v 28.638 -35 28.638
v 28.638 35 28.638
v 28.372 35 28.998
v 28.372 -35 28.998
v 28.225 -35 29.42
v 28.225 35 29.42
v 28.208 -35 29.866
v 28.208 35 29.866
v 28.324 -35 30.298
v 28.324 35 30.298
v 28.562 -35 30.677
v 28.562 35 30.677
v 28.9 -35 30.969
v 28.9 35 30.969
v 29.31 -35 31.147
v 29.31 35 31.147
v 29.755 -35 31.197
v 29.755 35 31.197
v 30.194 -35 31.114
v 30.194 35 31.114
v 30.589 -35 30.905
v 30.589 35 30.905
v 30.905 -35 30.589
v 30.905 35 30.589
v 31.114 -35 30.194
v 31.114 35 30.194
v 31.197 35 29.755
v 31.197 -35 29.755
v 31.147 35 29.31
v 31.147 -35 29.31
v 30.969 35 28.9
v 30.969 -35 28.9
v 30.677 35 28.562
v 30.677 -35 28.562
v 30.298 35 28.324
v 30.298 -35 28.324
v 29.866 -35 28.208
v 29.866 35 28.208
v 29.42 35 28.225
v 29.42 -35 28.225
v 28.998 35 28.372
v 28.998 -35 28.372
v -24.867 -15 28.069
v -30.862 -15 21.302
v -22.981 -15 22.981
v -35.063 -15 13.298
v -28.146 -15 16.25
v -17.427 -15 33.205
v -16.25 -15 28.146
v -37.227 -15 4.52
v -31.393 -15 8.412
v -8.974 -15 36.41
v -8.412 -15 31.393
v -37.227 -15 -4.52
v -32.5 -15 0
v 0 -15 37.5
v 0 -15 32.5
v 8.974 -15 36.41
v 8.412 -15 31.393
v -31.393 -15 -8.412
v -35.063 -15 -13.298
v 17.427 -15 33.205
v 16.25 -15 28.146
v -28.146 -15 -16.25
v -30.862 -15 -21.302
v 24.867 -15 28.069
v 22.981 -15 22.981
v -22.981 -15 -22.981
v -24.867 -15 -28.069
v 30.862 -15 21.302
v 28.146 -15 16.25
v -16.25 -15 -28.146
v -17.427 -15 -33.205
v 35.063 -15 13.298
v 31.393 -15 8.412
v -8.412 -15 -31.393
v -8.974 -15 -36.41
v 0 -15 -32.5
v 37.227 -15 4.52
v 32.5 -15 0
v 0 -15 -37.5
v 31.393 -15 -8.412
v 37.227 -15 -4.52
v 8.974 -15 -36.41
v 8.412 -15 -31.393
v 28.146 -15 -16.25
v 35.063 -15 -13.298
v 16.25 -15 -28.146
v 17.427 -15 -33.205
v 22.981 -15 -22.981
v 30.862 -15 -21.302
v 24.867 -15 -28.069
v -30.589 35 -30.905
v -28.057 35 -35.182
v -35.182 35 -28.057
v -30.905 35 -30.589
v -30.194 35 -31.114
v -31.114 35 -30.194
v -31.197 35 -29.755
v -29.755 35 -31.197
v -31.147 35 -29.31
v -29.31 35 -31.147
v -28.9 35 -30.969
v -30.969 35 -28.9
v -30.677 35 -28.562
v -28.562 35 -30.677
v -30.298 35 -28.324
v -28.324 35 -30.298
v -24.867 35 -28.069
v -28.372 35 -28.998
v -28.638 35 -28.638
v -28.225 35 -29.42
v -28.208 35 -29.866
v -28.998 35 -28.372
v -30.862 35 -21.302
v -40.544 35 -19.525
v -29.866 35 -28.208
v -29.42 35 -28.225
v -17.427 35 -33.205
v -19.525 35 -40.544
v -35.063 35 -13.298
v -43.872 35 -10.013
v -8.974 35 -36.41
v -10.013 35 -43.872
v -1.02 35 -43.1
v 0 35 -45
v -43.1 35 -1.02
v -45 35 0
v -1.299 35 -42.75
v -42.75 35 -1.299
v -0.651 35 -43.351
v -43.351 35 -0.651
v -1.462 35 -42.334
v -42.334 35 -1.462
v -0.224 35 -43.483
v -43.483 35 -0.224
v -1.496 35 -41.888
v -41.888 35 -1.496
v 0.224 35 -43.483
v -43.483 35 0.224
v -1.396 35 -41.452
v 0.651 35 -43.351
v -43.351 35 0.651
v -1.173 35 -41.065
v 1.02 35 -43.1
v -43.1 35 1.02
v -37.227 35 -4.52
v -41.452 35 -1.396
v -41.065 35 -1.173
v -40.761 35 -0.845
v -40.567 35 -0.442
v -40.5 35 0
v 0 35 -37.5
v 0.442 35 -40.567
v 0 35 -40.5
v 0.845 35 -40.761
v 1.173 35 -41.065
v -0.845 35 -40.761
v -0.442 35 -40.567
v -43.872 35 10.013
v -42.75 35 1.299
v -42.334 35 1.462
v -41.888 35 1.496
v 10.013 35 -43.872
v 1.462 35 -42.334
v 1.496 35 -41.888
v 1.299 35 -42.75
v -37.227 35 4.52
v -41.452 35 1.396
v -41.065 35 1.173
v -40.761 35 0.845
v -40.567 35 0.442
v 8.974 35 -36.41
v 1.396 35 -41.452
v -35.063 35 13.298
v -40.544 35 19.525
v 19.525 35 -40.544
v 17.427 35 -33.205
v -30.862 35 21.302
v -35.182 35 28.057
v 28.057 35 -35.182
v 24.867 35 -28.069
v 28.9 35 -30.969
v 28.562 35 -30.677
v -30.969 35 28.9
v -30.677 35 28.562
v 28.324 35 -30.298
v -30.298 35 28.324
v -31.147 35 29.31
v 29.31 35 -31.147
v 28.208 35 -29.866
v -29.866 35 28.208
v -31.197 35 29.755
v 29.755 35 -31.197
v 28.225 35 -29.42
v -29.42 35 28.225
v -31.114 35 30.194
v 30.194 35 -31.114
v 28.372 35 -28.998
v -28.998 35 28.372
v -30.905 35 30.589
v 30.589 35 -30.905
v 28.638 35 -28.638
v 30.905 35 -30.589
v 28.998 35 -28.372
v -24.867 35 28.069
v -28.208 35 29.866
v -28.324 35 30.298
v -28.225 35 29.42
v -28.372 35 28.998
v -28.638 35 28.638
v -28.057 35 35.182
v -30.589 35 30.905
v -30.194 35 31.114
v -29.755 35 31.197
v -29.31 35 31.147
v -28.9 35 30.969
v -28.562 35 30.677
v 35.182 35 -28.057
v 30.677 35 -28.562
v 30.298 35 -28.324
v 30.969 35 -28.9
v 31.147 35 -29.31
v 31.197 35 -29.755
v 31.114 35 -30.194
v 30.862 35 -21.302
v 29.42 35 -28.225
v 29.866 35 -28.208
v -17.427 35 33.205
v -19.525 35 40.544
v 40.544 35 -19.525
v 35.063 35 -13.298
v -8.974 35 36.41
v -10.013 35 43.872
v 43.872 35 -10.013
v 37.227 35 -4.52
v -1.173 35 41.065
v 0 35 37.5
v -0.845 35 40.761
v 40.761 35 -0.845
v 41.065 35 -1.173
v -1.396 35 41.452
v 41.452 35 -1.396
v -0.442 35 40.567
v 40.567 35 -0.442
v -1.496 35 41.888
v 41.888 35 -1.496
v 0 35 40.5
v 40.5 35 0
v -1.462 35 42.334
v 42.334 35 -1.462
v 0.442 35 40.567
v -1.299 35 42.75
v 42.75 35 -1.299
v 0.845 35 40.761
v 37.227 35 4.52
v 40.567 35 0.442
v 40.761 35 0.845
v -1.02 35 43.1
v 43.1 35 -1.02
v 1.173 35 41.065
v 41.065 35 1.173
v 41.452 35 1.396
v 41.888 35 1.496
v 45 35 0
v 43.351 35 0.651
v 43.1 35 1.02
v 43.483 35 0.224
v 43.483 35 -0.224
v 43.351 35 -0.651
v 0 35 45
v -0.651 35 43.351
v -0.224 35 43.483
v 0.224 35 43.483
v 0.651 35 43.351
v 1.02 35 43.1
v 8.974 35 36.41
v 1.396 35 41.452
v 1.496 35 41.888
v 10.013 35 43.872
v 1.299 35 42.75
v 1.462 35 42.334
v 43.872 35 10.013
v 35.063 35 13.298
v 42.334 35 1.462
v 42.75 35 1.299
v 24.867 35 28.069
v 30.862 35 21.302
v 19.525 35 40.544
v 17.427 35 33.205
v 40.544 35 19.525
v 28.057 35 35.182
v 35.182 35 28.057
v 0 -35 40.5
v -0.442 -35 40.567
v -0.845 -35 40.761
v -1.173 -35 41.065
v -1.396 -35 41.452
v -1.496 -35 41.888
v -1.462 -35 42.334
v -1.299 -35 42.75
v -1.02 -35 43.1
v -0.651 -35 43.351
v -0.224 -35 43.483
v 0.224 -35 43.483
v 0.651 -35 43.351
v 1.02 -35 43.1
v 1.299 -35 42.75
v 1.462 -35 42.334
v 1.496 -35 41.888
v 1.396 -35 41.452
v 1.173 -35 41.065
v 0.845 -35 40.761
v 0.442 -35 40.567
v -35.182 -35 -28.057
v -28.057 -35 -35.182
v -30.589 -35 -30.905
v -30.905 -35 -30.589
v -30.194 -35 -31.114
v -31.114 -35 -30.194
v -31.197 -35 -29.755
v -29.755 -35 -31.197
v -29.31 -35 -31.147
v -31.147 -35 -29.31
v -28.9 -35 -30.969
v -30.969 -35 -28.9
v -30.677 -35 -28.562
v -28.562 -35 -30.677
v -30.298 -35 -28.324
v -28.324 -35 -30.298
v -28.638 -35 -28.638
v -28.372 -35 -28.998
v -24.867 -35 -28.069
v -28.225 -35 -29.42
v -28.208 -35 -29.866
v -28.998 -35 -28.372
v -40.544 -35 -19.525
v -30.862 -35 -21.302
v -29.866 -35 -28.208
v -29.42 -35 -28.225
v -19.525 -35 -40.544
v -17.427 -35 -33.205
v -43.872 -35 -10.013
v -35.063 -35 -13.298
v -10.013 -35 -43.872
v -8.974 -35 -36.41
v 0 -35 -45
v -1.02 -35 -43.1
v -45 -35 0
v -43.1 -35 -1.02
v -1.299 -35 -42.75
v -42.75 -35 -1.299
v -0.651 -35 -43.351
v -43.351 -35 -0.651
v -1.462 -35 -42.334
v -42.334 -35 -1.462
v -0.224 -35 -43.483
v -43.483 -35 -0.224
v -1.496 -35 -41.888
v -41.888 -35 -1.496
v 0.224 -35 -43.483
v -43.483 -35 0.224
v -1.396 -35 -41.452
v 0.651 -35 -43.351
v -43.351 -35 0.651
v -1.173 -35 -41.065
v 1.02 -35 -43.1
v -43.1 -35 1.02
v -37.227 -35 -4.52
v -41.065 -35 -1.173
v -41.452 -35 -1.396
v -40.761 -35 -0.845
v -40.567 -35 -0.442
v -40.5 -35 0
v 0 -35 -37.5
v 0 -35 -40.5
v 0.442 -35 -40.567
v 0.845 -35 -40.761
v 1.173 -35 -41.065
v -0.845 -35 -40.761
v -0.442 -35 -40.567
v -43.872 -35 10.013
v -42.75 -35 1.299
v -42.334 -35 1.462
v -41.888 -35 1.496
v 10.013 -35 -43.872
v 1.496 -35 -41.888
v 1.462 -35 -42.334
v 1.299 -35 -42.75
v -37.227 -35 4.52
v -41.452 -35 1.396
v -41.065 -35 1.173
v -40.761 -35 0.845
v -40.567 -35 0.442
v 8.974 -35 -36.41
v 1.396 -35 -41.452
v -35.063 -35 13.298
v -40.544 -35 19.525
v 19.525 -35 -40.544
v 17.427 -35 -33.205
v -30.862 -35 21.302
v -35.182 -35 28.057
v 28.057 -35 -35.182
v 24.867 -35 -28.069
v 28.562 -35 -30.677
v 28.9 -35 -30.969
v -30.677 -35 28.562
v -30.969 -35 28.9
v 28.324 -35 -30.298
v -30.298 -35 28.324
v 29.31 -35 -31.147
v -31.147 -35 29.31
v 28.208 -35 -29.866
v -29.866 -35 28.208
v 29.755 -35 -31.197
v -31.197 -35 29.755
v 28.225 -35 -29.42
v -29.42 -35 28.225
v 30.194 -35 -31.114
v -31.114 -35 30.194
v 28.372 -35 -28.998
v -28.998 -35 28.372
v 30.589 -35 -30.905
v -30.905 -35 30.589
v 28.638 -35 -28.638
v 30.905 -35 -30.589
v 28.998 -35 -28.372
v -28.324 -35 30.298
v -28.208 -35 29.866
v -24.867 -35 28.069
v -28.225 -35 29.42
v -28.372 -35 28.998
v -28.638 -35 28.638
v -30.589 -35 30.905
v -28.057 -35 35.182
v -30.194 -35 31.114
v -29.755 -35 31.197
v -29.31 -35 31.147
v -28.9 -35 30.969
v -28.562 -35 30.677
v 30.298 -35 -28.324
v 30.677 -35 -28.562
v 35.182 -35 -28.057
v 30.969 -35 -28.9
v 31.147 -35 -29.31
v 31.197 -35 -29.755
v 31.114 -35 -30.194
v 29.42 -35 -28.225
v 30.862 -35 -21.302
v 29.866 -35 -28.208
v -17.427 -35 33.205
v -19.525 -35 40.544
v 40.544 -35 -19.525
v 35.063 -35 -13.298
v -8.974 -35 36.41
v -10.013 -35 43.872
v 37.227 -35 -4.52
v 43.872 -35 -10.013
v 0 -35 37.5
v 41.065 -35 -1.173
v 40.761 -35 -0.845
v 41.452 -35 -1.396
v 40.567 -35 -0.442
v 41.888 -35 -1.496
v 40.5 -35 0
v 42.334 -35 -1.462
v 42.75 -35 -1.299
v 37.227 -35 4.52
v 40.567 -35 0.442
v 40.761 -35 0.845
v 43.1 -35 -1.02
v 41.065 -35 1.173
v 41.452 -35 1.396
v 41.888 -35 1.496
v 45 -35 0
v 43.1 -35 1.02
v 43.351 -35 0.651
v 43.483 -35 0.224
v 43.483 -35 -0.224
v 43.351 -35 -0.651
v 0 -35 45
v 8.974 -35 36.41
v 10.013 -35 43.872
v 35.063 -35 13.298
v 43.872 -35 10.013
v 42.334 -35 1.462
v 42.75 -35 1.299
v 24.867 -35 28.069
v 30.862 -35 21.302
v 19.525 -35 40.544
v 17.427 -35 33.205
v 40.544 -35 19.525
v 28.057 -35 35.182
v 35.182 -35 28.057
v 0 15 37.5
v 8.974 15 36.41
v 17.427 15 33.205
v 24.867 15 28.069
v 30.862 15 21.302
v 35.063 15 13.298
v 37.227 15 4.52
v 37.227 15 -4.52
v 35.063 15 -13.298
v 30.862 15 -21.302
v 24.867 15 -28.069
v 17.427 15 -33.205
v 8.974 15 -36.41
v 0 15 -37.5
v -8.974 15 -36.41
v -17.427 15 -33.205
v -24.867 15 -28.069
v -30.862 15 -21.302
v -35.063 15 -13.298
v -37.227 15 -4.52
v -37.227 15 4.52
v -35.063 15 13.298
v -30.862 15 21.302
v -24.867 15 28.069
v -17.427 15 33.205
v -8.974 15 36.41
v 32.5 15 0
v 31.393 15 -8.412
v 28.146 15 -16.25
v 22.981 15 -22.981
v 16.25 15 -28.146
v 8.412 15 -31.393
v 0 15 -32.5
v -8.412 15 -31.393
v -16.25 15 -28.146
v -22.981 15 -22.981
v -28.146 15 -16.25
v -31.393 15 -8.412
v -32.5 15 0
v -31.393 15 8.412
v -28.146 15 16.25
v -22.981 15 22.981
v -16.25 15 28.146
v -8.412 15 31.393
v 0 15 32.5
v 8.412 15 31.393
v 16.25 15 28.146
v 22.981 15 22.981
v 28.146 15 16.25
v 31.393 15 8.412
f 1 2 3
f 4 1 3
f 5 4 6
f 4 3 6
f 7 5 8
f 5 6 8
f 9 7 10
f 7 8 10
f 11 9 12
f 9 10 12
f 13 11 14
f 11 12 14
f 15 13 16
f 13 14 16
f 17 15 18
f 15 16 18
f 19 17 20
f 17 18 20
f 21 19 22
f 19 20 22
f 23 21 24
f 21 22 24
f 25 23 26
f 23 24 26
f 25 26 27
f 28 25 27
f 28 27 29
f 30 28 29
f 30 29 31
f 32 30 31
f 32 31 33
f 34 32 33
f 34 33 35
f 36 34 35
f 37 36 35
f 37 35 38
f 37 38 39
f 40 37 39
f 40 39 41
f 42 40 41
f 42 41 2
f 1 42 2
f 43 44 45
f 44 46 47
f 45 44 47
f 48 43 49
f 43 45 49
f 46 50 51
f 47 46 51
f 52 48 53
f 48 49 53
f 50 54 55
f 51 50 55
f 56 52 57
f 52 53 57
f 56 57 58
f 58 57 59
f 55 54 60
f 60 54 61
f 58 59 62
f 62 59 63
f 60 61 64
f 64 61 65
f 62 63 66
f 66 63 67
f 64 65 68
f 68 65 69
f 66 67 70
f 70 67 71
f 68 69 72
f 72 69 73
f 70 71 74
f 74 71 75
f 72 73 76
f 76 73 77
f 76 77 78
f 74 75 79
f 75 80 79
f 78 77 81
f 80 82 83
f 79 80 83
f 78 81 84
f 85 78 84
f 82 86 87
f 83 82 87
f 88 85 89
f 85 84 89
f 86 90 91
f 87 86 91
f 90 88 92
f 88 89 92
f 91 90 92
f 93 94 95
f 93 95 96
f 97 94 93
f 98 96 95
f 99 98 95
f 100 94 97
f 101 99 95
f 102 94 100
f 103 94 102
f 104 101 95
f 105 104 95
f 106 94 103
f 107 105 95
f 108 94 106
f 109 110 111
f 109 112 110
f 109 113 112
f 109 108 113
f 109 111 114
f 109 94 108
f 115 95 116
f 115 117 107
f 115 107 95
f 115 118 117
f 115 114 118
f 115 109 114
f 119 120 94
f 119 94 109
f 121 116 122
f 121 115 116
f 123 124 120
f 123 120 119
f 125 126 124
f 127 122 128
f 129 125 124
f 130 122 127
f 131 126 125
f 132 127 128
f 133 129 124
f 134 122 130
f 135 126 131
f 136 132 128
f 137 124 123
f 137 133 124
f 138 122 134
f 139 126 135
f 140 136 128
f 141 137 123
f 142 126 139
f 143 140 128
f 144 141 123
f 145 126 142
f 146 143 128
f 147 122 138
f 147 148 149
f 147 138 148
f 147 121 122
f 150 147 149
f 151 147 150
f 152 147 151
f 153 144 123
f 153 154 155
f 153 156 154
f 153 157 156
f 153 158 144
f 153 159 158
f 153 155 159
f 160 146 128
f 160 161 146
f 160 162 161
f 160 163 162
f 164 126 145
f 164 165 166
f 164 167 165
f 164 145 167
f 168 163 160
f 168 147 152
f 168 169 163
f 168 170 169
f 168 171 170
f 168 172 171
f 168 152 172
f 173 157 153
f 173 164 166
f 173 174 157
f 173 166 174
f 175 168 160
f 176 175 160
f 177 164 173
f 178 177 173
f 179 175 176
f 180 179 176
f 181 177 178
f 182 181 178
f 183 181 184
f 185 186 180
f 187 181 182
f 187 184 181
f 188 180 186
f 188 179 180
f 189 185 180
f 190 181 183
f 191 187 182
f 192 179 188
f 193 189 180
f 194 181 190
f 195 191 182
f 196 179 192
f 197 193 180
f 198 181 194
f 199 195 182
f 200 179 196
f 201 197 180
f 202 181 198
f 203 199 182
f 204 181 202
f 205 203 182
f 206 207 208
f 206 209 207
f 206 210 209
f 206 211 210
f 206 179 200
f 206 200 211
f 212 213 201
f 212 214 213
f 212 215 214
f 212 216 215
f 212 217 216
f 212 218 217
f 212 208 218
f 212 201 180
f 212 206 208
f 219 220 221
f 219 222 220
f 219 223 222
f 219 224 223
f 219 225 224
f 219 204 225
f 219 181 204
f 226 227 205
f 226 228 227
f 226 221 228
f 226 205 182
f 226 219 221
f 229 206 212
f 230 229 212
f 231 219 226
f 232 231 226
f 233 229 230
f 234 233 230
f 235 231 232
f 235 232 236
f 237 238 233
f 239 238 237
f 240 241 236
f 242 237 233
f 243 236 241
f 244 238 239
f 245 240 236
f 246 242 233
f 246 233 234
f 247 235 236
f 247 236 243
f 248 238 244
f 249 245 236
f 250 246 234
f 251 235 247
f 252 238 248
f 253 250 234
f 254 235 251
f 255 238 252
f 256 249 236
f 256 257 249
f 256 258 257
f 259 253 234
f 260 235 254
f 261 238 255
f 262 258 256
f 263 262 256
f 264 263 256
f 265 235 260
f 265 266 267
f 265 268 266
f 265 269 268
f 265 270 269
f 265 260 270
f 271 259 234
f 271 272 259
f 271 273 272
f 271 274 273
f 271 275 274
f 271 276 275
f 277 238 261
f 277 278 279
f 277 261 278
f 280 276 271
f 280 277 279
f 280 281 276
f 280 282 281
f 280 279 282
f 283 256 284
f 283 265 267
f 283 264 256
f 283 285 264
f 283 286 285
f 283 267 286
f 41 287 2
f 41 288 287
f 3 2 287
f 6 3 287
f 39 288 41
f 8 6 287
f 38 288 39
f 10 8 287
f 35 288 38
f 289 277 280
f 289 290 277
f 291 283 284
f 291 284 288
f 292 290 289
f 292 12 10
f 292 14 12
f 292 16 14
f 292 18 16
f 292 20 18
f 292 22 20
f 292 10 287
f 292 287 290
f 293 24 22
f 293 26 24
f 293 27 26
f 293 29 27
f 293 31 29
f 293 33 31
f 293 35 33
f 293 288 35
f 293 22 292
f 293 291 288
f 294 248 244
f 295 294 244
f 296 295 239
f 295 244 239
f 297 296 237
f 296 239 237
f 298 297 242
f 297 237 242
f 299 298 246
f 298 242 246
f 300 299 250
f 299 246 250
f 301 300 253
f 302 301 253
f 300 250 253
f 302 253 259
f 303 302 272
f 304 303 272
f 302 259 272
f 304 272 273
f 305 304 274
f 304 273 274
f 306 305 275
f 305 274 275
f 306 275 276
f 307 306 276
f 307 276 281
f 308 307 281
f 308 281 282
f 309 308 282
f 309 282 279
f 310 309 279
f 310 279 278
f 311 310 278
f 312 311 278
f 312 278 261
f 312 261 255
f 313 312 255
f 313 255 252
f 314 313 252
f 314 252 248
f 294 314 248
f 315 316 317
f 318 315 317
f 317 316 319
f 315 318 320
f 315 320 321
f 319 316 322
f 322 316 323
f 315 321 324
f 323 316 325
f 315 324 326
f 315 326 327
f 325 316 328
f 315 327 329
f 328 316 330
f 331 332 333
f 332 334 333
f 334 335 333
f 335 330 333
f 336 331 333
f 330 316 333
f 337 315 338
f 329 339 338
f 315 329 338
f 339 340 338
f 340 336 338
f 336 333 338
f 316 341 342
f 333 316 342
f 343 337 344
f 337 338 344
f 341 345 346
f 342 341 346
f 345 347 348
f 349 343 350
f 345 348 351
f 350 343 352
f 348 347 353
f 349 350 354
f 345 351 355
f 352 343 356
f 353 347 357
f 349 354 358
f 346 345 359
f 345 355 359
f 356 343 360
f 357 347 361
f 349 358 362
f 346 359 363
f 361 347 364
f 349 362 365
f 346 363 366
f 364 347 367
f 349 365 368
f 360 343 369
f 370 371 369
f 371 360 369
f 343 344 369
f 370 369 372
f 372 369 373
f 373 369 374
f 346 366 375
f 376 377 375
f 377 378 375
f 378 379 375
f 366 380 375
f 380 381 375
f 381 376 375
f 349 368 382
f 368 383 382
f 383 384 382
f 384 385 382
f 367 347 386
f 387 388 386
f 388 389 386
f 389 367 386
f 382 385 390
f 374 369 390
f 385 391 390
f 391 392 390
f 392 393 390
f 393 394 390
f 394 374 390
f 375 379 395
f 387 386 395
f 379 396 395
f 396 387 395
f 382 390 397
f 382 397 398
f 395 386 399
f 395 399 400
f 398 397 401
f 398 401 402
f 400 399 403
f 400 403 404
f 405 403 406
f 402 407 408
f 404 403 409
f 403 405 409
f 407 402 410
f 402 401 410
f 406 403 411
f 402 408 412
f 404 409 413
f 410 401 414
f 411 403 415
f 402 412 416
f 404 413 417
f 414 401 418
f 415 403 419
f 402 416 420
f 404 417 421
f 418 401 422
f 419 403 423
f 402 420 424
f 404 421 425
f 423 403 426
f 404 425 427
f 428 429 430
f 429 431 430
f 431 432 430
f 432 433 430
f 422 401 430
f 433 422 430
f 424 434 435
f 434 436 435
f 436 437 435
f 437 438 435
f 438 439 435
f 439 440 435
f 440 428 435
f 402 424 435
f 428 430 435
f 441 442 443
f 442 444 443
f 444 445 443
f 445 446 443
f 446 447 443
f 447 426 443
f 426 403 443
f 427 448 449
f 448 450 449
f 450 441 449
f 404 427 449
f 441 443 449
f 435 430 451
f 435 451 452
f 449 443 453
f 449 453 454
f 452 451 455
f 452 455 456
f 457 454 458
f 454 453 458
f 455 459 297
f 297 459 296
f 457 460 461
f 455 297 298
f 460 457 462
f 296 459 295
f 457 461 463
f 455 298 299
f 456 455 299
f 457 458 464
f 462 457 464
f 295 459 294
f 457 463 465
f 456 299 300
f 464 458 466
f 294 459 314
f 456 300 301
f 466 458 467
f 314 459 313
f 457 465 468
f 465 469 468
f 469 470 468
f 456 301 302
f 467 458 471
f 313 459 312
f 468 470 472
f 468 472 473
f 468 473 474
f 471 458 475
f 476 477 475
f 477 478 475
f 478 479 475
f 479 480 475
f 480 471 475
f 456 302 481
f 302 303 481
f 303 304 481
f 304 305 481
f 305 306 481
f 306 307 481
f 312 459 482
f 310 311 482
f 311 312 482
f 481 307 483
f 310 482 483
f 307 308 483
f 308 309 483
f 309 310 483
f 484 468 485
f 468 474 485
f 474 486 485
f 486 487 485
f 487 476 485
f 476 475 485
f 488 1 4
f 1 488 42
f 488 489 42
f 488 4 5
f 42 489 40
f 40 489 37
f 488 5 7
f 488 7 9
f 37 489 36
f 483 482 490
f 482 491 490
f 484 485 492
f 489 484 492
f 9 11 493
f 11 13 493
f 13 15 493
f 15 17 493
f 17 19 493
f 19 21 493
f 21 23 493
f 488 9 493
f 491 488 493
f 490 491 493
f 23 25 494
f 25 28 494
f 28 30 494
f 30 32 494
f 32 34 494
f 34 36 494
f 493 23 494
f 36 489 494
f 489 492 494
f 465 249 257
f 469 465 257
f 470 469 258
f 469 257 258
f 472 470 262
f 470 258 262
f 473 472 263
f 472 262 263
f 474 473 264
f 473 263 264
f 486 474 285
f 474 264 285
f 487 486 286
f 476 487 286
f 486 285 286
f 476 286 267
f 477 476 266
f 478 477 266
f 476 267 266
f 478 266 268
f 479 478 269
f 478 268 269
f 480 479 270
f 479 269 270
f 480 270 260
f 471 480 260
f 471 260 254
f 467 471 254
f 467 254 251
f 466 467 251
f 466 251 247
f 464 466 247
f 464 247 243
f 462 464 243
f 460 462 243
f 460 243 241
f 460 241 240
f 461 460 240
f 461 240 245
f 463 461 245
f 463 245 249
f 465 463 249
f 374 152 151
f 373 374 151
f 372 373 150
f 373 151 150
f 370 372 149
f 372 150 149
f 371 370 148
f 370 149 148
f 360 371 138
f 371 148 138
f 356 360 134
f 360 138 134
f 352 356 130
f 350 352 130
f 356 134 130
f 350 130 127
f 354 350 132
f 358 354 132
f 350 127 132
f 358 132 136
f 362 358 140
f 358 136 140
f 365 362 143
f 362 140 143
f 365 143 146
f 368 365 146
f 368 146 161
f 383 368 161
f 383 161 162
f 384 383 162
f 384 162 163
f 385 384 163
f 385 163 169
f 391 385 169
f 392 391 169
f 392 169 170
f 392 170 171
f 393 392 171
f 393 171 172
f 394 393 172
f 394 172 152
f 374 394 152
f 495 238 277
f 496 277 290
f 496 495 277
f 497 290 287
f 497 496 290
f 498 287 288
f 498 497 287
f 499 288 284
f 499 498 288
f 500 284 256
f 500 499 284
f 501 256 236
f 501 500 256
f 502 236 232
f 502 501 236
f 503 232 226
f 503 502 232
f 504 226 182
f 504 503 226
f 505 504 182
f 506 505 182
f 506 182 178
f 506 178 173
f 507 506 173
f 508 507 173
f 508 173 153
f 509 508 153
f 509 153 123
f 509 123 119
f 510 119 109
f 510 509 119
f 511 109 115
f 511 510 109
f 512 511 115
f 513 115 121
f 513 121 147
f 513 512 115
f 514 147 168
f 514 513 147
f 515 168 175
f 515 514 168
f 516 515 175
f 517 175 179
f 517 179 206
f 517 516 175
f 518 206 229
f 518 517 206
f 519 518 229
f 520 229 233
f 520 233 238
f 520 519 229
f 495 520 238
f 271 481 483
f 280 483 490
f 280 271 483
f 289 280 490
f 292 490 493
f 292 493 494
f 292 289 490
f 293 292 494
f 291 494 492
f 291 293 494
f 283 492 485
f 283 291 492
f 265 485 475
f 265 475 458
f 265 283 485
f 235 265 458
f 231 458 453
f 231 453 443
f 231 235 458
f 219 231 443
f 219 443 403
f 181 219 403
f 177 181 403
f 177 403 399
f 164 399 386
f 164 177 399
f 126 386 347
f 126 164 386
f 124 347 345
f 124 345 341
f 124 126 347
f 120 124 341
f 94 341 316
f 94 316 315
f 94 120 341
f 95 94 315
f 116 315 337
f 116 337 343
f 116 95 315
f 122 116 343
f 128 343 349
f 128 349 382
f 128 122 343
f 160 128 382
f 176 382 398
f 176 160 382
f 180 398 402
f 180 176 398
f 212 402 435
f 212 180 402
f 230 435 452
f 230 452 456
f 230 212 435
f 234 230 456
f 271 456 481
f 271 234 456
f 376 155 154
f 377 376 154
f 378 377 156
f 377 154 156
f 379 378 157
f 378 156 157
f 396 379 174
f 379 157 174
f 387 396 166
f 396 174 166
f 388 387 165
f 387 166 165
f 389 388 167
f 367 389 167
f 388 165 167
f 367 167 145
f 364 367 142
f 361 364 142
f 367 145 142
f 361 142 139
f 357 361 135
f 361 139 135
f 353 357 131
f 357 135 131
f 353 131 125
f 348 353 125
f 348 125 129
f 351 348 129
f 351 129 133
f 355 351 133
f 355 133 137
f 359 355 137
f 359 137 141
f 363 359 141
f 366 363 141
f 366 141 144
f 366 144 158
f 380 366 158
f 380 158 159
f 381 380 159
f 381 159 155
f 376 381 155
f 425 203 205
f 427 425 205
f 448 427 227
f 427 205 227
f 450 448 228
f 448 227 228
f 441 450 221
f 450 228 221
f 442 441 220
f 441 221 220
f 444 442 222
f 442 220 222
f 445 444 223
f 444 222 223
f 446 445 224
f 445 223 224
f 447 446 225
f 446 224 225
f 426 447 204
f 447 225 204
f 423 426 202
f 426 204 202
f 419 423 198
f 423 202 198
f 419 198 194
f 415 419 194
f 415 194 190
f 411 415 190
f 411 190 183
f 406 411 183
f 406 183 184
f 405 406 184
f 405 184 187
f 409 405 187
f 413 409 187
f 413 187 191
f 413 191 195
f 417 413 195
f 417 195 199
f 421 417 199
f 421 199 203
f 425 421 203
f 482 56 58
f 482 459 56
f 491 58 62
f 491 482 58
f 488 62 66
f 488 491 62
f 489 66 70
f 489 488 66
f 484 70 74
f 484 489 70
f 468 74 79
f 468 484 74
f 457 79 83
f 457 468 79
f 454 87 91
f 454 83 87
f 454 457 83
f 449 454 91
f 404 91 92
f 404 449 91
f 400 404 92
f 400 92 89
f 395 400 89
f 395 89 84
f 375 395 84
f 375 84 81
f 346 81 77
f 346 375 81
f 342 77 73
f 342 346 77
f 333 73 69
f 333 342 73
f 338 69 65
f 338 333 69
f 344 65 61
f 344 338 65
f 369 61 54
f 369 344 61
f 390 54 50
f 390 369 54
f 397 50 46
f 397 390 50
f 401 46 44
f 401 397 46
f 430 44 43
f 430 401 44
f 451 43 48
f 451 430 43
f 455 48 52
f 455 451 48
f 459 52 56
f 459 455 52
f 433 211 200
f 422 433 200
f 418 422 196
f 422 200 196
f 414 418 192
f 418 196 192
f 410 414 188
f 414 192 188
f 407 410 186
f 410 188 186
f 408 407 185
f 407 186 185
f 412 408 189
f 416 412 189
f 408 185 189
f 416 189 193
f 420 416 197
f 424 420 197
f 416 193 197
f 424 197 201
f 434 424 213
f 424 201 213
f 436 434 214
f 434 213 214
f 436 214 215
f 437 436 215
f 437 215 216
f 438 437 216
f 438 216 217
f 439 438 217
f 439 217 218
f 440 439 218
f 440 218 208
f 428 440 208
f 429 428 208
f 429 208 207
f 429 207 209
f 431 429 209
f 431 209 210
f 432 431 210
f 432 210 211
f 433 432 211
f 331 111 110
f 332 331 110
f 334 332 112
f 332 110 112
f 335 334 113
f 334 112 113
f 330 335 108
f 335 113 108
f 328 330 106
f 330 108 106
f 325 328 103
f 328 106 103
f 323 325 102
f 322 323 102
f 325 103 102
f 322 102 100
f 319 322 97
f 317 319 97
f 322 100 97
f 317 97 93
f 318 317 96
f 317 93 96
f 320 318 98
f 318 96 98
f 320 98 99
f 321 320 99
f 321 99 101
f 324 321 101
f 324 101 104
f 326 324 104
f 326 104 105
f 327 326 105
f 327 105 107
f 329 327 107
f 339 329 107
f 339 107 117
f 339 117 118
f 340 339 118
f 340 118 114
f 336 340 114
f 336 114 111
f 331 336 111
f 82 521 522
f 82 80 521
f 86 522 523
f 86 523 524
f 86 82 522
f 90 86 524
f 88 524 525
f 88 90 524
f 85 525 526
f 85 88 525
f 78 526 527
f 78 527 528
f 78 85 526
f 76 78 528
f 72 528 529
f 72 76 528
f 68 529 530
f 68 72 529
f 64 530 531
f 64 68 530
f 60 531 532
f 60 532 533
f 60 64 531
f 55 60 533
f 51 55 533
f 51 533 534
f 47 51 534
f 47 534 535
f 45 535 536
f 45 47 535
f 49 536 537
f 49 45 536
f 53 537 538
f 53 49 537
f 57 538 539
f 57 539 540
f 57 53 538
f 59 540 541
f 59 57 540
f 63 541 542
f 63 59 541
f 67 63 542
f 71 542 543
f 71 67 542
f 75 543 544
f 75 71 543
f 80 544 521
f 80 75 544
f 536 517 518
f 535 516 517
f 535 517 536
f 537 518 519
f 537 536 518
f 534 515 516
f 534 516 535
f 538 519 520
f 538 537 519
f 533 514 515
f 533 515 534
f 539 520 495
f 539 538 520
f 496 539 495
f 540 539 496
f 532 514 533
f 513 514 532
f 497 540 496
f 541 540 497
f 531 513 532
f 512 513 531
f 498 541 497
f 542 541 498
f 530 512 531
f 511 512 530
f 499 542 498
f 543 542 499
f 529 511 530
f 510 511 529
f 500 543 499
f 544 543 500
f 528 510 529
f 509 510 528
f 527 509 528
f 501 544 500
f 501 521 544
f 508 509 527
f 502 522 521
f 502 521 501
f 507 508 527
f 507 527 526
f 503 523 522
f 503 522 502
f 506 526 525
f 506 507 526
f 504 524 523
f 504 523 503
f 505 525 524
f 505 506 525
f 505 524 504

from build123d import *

# Parameters (mm, degrees)
SKETCH1_R           = 45
SKETCH1_R_2         = 37.5
BOSS_EXTRUDE1_DEPTH = 35
SKETCH2_R           = 42.5
SKETCH2_R_2         = 32.5
EXTRUDE_THIN1_DEPTH = 15
SKETCH3_R           = 1.5
CUT_EXTRUDE1_DEPTH  = 95.604439642
CIRPATTERN1_COUNT   = 8


with BuildPart() as part:
    # Sketch1 → Boss-Extrude1 (new, symmetric)
    with BuildSketch(Plane(origin=(0, 0, 0), x_dir=(1, 0, 0), z_dir=(0, 1, 0))):
        with Locations(Location((0, 0, 0), (0, 0, 270))):
            Circle(SKETCH1_R)
        with Locations(Location((0, 0, 0), (0, 0, 270))):
            Circle(SKETCH1_R_2, mode=Mode.SUBTRACT)
    extrude(amount=BOSS_EXTRUDE1_DEPTH, both=True)

    # Sketch2 → Extrude-Thin1 (add, symmetric)
    with BuildSketch(Plane(origin=(0, 0, 0), x_dir=(1, 0, 0), z_dir=(0, 1, 0))):
        Circle(SKETCH2_R)
        Circle(SKETCH2_R_2, mode=Mode.SUBTRACT)
    extrude(amount=EXTRUDE_THIN1_DEPTH, both=True)

    # Sketch3 → Cut-Extrude1 (cut, through all)
    with BuildSketch(Plane(origin=(0, 35, 0), x_dir=(1, 0, 0), z_dir=(0, 1, 0))):
        with Locations(Location((0, 42, 0), (0, 0, 270))):
            Circle(SKETCH3_R)
    cut_extrude1 = extrude(amount=-CUT_EXTRUDE1_DEPTH, mode=Mode.SUBTRACT)

    # CirPattern1: Cut-Extrude1 ×8 about axis
    cirpattern1_axis = Axis((0, 0, 0), (0, 1, 0))
    for i in range(1, CIRPATTERN1_COUNT):
        add(cut_extrude1.rotate(cirpattern1_axis, i * 360 / CIRPATTERN1_COUNT), mode=Mode.SUBTRACT)


solid = part.part
